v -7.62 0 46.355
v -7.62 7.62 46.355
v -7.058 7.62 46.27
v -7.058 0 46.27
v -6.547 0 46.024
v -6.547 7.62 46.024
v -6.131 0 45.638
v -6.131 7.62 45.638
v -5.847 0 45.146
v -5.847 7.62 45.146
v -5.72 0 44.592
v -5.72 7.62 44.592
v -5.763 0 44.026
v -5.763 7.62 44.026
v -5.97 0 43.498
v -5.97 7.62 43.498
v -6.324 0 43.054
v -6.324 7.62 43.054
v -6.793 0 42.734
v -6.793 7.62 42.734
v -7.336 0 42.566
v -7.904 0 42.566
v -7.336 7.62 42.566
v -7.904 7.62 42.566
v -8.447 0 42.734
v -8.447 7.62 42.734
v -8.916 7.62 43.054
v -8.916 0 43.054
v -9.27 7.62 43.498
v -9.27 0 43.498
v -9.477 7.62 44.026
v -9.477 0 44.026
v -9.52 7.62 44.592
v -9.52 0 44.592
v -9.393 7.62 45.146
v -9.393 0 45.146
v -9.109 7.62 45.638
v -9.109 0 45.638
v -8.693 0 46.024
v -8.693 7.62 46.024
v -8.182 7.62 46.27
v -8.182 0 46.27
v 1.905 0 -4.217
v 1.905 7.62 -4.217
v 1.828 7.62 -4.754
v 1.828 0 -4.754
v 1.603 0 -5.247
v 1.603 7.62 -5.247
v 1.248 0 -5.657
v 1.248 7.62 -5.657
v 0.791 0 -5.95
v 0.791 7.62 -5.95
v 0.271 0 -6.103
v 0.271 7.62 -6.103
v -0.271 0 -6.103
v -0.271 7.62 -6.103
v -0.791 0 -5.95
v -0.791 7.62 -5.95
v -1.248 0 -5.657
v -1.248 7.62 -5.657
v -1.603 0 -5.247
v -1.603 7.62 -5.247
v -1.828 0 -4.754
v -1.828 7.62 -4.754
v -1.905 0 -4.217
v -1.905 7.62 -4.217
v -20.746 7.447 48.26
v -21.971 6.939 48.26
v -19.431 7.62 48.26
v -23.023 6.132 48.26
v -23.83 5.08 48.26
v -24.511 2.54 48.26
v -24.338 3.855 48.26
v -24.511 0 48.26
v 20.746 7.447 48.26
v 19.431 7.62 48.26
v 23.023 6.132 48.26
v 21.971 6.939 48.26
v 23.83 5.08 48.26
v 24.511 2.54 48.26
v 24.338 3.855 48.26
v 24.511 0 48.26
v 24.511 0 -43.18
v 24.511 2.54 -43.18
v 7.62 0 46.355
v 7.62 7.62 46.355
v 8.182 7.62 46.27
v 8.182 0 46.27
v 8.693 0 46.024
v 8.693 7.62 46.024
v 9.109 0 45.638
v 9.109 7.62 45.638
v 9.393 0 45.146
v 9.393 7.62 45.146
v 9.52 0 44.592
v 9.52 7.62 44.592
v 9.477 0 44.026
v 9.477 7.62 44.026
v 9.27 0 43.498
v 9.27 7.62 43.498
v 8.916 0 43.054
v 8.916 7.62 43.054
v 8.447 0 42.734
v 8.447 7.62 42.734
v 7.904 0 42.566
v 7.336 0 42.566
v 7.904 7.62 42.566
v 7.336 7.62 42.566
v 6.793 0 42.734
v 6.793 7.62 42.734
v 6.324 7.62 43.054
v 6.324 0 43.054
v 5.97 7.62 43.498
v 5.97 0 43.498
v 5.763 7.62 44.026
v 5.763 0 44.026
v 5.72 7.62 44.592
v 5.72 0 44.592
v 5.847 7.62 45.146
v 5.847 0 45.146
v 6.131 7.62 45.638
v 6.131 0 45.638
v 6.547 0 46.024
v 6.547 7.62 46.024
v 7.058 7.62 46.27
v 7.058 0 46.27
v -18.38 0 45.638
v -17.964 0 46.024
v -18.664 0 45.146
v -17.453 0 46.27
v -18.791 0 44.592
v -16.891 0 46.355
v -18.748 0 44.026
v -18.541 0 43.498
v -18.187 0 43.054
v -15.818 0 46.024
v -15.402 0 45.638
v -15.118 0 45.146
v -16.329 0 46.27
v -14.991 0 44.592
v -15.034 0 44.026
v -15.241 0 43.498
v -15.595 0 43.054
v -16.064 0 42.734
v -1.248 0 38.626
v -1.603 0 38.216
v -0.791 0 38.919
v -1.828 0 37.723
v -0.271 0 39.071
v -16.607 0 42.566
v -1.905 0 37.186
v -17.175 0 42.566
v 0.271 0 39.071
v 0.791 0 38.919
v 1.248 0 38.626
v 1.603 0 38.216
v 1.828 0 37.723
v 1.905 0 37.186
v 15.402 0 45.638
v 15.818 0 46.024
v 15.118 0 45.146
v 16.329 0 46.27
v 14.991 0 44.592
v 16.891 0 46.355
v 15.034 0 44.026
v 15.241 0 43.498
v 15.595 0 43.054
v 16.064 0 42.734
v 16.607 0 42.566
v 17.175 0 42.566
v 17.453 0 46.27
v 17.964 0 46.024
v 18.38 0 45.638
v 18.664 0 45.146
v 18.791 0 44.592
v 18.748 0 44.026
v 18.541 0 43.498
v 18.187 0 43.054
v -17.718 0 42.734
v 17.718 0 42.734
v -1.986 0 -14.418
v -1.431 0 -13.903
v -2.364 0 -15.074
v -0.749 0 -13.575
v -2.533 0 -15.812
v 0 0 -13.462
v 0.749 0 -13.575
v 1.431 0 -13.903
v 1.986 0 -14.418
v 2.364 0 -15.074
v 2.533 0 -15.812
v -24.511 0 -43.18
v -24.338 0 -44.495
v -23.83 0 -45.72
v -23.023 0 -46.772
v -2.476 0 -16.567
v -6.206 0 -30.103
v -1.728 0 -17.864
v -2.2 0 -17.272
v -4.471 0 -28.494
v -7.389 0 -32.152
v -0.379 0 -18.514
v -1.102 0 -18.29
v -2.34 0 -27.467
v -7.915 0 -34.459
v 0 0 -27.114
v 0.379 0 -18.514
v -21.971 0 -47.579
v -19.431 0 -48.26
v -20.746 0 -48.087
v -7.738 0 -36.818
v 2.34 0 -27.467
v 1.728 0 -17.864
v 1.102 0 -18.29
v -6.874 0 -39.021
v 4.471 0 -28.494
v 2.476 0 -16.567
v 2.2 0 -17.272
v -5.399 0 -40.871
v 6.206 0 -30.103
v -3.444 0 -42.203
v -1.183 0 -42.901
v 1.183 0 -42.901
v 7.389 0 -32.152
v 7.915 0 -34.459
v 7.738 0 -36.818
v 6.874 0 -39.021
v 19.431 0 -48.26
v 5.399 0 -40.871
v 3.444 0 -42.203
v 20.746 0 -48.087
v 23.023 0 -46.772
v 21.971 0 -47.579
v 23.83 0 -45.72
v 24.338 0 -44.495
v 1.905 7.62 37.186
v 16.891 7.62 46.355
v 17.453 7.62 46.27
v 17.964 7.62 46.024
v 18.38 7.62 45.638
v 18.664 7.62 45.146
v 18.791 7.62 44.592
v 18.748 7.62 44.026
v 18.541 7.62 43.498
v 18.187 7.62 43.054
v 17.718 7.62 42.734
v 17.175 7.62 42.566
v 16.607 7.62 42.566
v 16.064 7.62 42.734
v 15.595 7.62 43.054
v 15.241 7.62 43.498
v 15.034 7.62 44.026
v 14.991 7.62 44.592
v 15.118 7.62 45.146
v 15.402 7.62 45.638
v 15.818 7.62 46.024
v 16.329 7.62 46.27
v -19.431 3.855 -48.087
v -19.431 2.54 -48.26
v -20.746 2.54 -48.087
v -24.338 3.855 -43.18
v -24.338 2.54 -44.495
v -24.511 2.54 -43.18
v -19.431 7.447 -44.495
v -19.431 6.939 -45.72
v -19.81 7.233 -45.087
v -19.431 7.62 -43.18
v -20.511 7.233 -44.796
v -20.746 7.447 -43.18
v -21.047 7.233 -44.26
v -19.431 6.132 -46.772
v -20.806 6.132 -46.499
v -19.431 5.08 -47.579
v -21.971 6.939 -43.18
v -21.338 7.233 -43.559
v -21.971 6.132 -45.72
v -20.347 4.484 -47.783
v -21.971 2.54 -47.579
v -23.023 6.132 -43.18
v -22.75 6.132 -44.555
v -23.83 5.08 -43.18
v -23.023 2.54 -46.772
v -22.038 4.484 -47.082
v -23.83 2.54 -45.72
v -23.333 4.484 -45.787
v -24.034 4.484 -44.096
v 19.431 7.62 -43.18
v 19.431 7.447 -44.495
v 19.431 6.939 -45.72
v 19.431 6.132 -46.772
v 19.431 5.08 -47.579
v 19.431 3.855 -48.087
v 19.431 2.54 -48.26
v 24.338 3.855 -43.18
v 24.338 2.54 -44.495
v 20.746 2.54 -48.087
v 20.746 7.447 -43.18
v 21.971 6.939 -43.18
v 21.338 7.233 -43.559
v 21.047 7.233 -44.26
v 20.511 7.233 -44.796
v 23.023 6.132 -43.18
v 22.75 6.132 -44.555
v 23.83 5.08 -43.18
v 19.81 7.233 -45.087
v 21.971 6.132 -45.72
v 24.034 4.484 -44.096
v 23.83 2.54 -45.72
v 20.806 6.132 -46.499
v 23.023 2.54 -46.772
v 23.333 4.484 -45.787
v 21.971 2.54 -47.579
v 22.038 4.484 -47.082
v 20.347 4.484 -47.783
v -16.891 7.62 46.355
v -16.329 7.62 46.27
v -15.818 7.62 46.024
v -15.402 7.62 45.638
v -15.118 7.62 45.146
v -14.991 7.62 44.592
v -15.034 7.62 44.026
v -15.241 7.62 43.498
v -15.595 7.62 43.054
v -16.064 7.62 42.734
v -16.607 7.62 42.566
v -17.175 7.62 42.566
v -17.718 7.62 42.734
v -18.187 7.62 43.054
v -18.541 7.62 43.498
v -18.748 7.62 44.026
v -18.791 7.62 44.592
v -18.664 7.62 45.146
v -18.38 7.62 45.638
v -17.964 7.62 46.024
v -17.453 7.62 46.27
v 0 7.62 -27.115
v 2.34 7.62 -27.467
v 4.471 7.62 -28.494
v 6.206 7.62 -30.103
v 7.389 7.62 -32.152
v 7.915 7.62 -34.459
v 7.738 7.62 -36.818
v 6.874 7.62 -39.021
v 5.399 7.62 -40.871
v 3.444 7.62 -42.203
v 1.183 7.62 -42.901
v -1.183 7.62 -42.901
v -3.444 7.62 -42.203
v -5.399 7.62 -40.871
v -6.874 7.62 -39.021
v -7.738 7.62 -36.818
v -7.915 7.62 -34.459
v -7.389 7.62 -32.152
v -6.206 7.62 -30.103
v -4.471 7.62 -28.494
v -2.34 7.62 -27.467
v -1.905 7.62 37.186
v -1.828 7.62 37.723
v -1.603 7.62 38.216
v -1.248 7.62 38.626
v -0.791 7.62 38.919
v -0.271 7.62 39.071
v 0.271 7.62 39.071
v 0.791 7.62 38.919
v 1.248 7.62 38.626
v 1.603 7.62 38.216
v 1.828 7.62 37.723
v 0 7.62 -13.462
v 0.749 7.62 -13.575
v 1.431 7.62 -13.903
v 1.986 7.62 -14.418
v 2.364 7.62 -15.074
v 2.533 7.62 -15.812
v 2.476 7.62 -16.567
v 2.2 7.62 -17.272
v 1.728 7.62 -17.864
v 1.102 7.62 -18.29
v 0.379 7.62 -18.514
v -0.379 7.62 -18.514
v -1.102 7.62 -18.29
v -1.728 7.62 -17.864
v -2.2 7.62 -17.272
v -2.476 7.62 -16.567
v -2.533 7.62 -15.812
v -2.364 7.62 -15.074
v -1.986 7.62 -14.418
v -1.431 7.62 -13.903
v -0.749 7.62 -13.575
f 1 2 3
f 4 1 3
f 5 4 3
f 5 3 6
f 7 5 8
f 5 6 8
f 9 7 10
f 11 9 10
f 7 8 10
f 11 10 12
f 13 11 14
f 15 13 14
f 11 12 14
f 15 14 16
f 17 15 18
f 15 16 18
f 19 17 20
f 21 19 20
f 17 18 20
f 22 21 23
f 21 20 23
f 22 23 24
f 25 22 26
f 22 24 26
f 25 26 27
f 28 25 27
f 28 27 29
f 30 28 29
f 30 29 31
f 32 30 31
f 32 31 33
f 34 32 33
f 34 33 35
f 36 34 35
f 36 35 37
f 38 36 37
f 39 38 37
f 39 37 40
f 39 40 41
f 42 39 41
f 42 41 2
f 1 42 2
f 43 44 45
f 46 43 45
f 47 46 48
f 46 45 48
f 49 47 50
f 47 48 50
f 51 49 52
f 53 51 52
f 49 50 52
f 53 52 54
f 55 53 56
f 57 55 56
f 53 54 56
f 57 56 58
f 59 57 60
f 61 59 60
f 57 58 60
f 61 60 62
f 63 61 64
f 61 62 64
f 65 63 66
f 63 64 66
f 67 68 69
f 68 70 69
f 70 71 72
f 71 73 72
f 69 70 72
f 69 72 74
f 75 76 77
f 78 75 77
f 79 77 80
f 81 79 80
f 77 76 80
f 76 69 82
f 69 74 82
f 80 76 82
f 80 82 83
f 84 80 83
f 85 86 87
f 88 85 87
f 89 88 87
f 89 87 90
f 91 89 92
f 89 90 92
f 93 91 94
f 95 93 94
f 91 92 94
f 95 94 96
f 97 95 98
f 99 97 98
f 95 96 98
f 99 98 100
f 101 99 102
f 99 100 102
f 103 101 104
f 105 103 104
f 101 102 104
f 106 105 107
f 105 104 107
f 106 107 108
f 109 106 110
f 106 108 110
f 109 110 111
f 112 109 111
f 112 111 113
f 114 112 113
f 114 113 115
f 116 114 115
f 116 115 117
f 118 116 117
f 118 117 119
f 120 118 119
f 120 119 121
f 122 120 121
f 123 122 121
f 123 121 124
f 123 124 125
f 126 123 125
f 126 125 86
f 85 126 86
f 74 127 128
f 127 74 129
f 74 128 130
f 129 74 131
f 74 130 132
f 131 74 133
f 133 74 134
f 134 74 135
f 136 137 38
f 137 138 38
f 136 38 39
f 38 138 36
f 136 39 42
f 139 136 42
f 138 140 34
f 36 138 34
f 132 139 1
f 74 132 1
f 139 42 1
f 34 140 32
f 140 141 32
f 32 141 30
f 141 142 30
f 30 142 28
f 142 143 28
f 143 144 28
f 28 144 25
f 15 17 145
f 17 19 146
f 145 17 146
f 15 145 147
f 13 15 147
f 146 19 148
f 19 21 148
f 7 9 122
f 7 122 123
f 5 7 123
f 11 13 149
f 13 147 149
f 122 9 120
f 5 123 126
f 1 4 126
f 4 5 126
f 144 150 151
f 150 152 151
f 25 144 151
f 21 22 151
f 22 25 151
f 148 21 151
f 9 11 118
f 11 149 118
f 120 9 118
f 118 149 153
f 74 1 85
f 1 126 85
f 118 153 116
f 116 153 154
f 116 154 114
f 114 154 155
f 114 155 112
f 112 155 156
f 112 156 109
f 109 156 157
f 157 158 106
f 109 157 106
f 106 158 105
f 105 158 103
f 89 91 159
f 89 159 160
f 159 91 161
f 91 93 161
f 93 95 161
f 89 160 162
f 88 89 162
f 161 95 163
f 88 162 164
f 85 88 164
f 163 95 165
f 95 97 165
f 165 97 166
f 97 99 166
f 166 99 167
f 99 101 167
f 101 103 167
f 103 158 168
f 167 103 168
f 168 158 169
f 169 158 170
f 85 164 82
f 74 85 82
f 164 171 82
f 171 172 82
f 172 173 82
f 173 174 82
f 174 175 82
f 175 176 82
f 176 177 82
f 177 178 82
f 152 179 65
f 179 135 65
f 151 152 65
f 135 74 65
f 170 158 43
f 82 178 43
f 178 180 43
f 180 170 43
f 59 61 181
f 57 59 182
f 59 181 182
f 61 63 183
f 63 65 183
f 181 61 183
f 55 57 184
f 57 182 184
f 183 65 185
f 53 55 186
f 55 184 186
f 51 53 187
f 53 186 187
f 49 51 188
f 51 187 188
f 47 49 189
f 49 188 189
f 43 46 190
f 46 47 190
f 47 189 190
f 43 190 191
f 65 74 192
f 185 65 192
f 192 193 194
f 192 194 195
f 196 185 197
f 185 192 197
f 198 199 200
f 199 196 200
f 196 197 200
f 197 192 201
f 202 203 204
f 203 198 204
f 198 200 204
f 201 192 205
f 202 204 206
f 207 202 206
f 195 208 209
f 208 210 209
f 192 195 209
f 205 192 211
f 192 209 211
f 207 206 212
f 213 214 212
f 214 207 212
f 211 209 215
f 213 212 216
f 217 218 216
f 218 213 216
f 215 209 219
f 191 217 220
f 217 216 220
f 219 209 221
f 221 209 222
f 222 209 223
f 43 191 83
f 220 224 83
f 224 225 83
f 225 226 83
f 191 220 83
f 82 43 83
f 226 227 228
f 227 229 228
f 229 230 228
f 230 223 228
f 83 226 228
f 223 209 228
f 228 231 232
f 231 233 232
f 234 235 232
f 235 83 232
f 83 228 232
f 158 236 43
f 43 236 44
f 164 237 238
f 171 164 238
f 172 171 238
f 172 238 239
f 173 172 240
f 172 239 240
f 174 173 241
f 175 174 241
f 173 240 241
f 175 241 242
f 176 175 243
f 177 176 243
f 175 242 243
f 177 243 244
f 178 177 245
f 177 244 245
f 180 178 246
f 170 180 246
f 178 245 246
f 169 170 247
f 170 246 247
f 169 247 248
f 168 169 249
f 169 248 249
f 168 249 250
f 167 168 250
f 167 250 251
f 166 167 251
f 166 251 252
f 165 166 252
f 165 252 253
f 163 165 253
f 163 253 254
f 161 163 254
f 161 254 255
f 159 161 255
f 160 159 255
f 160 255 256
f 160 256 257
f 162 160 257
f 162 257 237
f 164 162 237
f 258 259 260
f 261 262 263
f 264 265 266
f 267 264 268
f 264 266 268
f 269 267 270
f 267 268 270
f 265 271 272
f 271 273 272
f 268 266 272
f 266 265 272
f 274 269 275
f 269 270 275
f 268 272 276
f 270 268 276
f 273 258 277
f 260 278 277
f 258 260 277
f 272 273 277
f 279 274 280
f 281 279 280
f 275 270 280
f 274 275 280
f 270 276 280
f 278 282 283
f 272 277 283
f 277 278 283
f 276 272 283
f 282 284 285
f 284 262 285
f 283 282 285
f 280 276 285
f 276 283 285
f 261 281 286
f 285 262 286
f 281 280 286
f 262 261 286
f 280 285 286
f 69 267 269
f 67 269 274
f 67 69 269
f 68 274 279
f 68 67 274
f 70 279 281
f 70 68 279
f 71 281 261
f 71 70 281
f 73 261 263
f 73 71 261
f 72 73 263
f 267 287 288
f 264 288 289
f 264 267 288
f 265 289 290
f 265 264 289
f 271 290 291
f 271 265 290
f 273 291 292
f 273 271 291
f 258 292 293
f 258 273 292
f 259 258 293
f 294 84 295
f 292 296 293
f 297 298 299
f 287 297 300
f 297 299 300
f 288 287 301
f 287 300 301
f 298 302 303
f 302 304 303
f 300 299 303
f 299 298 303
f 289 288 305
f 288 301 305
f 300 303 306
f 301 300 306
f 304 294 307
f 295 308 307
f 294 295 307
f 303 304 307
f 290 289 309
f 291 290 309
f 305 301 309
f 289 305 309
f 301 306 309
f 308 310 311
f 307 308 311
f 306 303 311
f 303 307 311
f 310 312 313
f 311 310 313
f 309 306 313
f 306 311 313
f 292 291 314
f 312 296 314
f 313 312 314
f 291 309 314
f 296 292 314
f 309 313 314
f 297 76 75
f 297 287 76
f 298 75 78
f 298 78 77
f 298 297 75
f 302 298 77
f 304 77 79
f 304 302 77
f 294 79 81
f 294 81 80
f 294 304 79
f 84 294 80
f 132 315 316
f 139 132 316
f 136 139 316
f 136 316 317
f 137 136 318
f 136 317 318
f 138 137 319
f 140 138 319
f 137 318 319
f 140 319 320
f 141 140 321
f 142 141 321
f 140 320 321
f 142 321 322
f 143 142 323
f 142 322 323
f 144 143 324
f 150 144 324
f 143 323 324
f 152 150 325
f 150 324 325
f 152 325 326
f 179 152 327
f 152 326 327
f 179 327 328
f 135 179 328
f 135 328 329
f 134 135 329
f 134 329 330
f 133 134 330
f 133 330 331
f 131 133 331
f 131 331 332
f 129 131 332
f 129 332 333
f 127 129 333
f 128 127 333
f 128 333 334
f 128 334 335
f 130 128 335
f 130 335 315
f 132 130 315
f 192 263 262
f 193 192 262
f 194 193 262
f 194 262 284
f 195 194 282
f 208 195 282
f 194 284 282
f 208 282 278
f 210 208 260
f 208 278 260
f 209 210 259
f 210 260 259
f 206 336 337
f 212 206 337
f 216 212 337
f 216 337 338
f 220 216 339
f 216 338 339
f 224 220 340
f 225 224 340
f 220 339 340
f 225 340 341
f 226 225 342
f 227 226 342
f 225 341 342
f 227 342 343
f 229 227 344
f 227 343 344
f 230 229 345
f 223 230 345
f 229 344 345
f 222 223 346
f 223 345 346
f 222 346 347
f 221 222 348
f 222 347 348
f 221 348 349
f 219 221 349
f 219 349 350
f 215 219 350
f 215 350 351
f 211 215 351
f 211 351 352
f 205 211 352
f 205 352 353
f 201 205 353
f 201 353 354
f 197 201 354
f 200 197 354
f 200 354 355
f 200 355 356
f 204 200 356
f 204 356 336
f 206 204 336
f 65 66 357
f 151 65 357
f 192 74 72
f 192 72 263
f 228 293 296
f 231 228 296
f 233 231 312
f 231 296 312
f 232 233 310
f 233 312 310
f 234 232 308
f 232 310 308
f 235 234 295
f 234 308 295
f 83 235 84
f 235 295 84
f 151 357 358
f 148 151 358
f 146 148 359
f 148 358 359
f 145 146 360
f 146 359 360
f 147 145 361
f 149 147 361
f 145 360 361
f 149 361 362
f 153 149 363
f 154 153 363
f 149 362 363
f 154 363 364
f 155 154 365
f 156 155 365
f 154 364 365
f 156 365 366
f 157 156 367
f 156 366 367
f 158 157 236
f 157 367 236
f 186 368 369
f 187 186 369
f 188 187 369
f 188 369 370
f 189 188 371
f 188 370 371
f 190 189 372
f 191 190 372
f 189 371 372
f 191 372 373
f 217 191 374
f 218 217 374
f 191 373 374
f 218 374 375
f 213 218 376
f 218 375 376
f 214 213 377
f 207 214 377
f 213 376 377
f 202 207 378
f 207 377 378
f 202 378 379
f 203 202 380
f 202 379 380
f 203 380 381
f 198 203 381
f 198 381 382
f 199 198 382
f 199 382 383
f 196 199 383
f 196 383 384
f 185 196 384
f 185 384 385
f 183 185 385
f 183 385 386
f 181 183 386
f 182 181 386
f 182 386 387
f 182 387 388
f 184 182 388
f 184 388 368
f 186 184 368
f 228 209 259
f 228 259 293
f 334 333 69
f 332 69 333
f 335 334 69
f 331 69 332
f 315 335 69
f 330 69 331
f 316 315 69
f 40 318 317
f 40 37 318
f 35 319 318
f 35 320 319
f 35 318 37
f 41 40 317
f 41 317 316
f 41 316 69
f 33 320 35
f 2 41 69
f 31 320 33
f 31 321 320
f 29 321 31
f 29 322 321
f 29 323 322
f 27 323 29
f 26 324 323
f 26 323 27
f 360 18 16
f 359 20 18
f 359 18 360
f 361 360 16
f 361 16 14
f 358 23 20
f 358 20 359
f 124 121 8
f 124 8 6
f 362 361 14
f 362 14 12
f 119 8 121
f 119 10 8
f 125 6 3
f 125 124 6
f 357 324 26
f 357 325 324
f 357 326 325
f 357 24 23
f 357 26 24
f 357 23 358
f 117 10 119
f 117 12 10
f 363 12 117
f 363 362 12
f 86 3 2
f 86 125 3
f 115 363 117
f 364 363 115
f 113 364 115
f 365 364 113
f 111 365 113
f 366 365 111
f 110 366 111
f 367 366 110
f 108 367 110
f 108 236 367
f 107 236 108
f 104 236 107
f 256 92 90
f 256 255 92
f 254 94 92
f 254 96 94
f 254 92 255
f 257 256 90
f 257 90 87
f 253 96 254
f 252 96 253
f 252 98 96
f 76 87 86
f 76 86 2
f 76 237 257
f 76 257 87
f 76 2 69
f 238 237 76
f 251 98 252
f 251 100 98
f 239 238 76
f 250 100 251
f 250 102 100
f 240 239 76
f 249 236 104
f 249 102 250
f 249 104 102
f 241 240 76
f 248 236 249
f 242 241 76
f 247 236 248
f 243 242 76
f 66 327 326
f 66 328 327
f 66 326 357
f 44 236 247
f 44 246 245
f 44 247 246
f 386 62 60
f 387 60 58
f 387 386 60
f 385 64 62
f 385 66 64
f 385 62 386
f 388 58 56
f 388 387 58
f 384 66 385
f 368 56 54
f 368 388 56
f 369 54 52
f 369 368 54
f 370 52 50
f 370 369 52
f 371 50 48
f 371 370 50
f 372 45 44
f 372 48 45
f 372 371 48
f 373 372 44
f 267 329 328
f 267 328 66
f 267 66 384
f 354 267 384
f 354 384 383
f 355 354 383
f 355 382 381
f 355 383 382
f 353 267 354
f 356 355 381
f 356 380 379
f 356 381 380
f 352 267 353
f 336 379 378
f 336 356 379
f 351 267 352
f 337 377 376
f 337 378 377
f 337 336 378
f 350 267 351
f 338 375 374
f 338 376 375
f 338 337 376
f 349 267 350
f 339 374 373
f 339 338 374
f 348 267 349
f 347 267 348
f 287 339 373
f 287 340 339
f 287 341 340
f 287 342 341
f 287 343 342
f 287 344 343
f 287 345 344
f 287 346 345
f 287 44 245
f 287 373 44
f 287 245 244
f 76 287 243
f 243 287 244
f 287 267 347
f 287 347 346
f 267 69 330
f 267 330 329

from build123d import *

# Parameters (mm, degrees)
SKETCH1_W           = 49.022
SKETCH1_H           = 96.52
BOSS_EXTRUDE1_DEPTH = 7.62
SKETCH2_R           = 1.905
CUT_EXTRUDE1_DEPTH  = 55.661514075
SKETCH3_R           = 7.9375
CUT_EXTRUDE2_DEPTH  = 55.661514075
FILLET1_R           = 5.08
FILLET2_R           = 5.08
CUT_EXTRUDE3_DEPTH  = 55.661514075
SKETCH5_R           = 7.9375
SKETCH5_R_2         = 2.54
CUT_EXTRUDE4_DEPTH  = 55.661514075


with BuildPart() as part:
    # Sketch1 → Boss-Extrude1 (new body)
    with BuildSketch(Plane(origin=(0, 0, 0), x_dir=(1, 0, 0), z_dir=(0, 1, 0))):
        Rectangle(SKETCH1_W, SKETCH1_H)
    extrude(amount=BOSS_EXTRUDE1_DEPTH)

    # Sketch2 → Cut-Extrude1 (cut, through all)
    with BuildSketch(Plane(origin=(0, 7.62, 0), x_dir=(1, 0, 0), z_dir=(0, 1, 0))):
        with Locations(Location((-16.891, -44.45, 0), (0, 0, 270))):
            Circle(SKETCH2_R)
        with Locations(Location((-7.62, -44.45, 0), (0, 0, 270))):
            Circle(SKETCH2_R)
        with Locations(Location((7.62, -44.45, 0), (0, 0, 270))):
            Circle(SKETCH2_R)
        with Locations(Location((16.891, -44.45, 0), (0, 0, 270))):
            Circle(SKETCH2_R)
    extrude(amount=-CUT_EXTRUDE1_DEPTH, mode=Mode.SUBTRACT)

    # Sketch3 → Cut-Extrude2 (cut, through all)
    with BuildSketch(Plane(origin=(0, 7.62, 0), x_dir=(1, 0, 0), z_dir=(0, 1, 0))):
        with Locations(Location((0, 35.052, 0), (0, 0, 270))):
            Circle(SKETCH3_R)
    extrude(amount=-CUT_EXTRUDE2_DEPTH, mode=Mode.SUBTRACT)

    # Fillet1
    fillet1_edges = [part.edges().sort_by_distance(p)[0] for p in [
        (-24.511, 3.81, -48.26),
        (24.511, 3.81, -48.26),
    ]]
    fillet(fillet1_edges, radius=FILLET1_R)

    # Fillet2
    fillet2_edges = [part.edges().sort_by_distance(p)[0] for p in [
        (24.511, 7.62, 2.54),
        (-24.511, 7.62, 2.54),
        (0, 7.62, -48.26),
        (23.023102448, 7.62, -46.772102448),
        (-23.023102448, 7.62, -46.772102448),
    ]]
    fillet(fillet2_edges, radius=FILLET2_R)

    # Sketch4 → Cut-Extrude3 (cut, through all)
    with BuildSketch(Plane(origin=(0, 7.62, 0), x_dir=(1, 0, 0), z_dir=(0, 1, 0))):
        with BuildLine():
            Line((-1.905, -34.645821142), (-1.905, -37.185821142))
            ThreePointArc((-1.905, -37.185821142), (0, -39.090821142), (1.905, -37.185821142))
            Line((1.905, -37.185821142), (1.905, -34.645821142))
            Line((1.905, -34.645821142), (1.905, 4.217007536))
            ThreePointArc((1.905, 4.217007536), (0, 6.122007536), (-1.905, 4.217007536))
            Line((-1.905, 4.217007536), (-1.905, -34.645821142))
        make_face()
    extrude(amount=-CUT_EXTRUDE3_DEPTH, mode=Mode.SUBTRACT)

    # Sketch5 → Cut-Extrude4 (cut, through all)
    with BuildSketch(Plane(origin=(0, 7.62, 0), x_dir=(1, 0, 0), z_dir=(0, 1, 0))):
        with Locations(Location((0, 35.052, 0), (0, 0, 270))):
            Circle(SKETCH5_R)
        with Locations(Location((0, 16.002, 0), (0, 0, 270))):
            Circle(SKETCH5_R_2)
    extrude(amount=-CUT_EXTRUDE4_DEPTH, mode=Mode.SUBTRACT)


solid = part.part
